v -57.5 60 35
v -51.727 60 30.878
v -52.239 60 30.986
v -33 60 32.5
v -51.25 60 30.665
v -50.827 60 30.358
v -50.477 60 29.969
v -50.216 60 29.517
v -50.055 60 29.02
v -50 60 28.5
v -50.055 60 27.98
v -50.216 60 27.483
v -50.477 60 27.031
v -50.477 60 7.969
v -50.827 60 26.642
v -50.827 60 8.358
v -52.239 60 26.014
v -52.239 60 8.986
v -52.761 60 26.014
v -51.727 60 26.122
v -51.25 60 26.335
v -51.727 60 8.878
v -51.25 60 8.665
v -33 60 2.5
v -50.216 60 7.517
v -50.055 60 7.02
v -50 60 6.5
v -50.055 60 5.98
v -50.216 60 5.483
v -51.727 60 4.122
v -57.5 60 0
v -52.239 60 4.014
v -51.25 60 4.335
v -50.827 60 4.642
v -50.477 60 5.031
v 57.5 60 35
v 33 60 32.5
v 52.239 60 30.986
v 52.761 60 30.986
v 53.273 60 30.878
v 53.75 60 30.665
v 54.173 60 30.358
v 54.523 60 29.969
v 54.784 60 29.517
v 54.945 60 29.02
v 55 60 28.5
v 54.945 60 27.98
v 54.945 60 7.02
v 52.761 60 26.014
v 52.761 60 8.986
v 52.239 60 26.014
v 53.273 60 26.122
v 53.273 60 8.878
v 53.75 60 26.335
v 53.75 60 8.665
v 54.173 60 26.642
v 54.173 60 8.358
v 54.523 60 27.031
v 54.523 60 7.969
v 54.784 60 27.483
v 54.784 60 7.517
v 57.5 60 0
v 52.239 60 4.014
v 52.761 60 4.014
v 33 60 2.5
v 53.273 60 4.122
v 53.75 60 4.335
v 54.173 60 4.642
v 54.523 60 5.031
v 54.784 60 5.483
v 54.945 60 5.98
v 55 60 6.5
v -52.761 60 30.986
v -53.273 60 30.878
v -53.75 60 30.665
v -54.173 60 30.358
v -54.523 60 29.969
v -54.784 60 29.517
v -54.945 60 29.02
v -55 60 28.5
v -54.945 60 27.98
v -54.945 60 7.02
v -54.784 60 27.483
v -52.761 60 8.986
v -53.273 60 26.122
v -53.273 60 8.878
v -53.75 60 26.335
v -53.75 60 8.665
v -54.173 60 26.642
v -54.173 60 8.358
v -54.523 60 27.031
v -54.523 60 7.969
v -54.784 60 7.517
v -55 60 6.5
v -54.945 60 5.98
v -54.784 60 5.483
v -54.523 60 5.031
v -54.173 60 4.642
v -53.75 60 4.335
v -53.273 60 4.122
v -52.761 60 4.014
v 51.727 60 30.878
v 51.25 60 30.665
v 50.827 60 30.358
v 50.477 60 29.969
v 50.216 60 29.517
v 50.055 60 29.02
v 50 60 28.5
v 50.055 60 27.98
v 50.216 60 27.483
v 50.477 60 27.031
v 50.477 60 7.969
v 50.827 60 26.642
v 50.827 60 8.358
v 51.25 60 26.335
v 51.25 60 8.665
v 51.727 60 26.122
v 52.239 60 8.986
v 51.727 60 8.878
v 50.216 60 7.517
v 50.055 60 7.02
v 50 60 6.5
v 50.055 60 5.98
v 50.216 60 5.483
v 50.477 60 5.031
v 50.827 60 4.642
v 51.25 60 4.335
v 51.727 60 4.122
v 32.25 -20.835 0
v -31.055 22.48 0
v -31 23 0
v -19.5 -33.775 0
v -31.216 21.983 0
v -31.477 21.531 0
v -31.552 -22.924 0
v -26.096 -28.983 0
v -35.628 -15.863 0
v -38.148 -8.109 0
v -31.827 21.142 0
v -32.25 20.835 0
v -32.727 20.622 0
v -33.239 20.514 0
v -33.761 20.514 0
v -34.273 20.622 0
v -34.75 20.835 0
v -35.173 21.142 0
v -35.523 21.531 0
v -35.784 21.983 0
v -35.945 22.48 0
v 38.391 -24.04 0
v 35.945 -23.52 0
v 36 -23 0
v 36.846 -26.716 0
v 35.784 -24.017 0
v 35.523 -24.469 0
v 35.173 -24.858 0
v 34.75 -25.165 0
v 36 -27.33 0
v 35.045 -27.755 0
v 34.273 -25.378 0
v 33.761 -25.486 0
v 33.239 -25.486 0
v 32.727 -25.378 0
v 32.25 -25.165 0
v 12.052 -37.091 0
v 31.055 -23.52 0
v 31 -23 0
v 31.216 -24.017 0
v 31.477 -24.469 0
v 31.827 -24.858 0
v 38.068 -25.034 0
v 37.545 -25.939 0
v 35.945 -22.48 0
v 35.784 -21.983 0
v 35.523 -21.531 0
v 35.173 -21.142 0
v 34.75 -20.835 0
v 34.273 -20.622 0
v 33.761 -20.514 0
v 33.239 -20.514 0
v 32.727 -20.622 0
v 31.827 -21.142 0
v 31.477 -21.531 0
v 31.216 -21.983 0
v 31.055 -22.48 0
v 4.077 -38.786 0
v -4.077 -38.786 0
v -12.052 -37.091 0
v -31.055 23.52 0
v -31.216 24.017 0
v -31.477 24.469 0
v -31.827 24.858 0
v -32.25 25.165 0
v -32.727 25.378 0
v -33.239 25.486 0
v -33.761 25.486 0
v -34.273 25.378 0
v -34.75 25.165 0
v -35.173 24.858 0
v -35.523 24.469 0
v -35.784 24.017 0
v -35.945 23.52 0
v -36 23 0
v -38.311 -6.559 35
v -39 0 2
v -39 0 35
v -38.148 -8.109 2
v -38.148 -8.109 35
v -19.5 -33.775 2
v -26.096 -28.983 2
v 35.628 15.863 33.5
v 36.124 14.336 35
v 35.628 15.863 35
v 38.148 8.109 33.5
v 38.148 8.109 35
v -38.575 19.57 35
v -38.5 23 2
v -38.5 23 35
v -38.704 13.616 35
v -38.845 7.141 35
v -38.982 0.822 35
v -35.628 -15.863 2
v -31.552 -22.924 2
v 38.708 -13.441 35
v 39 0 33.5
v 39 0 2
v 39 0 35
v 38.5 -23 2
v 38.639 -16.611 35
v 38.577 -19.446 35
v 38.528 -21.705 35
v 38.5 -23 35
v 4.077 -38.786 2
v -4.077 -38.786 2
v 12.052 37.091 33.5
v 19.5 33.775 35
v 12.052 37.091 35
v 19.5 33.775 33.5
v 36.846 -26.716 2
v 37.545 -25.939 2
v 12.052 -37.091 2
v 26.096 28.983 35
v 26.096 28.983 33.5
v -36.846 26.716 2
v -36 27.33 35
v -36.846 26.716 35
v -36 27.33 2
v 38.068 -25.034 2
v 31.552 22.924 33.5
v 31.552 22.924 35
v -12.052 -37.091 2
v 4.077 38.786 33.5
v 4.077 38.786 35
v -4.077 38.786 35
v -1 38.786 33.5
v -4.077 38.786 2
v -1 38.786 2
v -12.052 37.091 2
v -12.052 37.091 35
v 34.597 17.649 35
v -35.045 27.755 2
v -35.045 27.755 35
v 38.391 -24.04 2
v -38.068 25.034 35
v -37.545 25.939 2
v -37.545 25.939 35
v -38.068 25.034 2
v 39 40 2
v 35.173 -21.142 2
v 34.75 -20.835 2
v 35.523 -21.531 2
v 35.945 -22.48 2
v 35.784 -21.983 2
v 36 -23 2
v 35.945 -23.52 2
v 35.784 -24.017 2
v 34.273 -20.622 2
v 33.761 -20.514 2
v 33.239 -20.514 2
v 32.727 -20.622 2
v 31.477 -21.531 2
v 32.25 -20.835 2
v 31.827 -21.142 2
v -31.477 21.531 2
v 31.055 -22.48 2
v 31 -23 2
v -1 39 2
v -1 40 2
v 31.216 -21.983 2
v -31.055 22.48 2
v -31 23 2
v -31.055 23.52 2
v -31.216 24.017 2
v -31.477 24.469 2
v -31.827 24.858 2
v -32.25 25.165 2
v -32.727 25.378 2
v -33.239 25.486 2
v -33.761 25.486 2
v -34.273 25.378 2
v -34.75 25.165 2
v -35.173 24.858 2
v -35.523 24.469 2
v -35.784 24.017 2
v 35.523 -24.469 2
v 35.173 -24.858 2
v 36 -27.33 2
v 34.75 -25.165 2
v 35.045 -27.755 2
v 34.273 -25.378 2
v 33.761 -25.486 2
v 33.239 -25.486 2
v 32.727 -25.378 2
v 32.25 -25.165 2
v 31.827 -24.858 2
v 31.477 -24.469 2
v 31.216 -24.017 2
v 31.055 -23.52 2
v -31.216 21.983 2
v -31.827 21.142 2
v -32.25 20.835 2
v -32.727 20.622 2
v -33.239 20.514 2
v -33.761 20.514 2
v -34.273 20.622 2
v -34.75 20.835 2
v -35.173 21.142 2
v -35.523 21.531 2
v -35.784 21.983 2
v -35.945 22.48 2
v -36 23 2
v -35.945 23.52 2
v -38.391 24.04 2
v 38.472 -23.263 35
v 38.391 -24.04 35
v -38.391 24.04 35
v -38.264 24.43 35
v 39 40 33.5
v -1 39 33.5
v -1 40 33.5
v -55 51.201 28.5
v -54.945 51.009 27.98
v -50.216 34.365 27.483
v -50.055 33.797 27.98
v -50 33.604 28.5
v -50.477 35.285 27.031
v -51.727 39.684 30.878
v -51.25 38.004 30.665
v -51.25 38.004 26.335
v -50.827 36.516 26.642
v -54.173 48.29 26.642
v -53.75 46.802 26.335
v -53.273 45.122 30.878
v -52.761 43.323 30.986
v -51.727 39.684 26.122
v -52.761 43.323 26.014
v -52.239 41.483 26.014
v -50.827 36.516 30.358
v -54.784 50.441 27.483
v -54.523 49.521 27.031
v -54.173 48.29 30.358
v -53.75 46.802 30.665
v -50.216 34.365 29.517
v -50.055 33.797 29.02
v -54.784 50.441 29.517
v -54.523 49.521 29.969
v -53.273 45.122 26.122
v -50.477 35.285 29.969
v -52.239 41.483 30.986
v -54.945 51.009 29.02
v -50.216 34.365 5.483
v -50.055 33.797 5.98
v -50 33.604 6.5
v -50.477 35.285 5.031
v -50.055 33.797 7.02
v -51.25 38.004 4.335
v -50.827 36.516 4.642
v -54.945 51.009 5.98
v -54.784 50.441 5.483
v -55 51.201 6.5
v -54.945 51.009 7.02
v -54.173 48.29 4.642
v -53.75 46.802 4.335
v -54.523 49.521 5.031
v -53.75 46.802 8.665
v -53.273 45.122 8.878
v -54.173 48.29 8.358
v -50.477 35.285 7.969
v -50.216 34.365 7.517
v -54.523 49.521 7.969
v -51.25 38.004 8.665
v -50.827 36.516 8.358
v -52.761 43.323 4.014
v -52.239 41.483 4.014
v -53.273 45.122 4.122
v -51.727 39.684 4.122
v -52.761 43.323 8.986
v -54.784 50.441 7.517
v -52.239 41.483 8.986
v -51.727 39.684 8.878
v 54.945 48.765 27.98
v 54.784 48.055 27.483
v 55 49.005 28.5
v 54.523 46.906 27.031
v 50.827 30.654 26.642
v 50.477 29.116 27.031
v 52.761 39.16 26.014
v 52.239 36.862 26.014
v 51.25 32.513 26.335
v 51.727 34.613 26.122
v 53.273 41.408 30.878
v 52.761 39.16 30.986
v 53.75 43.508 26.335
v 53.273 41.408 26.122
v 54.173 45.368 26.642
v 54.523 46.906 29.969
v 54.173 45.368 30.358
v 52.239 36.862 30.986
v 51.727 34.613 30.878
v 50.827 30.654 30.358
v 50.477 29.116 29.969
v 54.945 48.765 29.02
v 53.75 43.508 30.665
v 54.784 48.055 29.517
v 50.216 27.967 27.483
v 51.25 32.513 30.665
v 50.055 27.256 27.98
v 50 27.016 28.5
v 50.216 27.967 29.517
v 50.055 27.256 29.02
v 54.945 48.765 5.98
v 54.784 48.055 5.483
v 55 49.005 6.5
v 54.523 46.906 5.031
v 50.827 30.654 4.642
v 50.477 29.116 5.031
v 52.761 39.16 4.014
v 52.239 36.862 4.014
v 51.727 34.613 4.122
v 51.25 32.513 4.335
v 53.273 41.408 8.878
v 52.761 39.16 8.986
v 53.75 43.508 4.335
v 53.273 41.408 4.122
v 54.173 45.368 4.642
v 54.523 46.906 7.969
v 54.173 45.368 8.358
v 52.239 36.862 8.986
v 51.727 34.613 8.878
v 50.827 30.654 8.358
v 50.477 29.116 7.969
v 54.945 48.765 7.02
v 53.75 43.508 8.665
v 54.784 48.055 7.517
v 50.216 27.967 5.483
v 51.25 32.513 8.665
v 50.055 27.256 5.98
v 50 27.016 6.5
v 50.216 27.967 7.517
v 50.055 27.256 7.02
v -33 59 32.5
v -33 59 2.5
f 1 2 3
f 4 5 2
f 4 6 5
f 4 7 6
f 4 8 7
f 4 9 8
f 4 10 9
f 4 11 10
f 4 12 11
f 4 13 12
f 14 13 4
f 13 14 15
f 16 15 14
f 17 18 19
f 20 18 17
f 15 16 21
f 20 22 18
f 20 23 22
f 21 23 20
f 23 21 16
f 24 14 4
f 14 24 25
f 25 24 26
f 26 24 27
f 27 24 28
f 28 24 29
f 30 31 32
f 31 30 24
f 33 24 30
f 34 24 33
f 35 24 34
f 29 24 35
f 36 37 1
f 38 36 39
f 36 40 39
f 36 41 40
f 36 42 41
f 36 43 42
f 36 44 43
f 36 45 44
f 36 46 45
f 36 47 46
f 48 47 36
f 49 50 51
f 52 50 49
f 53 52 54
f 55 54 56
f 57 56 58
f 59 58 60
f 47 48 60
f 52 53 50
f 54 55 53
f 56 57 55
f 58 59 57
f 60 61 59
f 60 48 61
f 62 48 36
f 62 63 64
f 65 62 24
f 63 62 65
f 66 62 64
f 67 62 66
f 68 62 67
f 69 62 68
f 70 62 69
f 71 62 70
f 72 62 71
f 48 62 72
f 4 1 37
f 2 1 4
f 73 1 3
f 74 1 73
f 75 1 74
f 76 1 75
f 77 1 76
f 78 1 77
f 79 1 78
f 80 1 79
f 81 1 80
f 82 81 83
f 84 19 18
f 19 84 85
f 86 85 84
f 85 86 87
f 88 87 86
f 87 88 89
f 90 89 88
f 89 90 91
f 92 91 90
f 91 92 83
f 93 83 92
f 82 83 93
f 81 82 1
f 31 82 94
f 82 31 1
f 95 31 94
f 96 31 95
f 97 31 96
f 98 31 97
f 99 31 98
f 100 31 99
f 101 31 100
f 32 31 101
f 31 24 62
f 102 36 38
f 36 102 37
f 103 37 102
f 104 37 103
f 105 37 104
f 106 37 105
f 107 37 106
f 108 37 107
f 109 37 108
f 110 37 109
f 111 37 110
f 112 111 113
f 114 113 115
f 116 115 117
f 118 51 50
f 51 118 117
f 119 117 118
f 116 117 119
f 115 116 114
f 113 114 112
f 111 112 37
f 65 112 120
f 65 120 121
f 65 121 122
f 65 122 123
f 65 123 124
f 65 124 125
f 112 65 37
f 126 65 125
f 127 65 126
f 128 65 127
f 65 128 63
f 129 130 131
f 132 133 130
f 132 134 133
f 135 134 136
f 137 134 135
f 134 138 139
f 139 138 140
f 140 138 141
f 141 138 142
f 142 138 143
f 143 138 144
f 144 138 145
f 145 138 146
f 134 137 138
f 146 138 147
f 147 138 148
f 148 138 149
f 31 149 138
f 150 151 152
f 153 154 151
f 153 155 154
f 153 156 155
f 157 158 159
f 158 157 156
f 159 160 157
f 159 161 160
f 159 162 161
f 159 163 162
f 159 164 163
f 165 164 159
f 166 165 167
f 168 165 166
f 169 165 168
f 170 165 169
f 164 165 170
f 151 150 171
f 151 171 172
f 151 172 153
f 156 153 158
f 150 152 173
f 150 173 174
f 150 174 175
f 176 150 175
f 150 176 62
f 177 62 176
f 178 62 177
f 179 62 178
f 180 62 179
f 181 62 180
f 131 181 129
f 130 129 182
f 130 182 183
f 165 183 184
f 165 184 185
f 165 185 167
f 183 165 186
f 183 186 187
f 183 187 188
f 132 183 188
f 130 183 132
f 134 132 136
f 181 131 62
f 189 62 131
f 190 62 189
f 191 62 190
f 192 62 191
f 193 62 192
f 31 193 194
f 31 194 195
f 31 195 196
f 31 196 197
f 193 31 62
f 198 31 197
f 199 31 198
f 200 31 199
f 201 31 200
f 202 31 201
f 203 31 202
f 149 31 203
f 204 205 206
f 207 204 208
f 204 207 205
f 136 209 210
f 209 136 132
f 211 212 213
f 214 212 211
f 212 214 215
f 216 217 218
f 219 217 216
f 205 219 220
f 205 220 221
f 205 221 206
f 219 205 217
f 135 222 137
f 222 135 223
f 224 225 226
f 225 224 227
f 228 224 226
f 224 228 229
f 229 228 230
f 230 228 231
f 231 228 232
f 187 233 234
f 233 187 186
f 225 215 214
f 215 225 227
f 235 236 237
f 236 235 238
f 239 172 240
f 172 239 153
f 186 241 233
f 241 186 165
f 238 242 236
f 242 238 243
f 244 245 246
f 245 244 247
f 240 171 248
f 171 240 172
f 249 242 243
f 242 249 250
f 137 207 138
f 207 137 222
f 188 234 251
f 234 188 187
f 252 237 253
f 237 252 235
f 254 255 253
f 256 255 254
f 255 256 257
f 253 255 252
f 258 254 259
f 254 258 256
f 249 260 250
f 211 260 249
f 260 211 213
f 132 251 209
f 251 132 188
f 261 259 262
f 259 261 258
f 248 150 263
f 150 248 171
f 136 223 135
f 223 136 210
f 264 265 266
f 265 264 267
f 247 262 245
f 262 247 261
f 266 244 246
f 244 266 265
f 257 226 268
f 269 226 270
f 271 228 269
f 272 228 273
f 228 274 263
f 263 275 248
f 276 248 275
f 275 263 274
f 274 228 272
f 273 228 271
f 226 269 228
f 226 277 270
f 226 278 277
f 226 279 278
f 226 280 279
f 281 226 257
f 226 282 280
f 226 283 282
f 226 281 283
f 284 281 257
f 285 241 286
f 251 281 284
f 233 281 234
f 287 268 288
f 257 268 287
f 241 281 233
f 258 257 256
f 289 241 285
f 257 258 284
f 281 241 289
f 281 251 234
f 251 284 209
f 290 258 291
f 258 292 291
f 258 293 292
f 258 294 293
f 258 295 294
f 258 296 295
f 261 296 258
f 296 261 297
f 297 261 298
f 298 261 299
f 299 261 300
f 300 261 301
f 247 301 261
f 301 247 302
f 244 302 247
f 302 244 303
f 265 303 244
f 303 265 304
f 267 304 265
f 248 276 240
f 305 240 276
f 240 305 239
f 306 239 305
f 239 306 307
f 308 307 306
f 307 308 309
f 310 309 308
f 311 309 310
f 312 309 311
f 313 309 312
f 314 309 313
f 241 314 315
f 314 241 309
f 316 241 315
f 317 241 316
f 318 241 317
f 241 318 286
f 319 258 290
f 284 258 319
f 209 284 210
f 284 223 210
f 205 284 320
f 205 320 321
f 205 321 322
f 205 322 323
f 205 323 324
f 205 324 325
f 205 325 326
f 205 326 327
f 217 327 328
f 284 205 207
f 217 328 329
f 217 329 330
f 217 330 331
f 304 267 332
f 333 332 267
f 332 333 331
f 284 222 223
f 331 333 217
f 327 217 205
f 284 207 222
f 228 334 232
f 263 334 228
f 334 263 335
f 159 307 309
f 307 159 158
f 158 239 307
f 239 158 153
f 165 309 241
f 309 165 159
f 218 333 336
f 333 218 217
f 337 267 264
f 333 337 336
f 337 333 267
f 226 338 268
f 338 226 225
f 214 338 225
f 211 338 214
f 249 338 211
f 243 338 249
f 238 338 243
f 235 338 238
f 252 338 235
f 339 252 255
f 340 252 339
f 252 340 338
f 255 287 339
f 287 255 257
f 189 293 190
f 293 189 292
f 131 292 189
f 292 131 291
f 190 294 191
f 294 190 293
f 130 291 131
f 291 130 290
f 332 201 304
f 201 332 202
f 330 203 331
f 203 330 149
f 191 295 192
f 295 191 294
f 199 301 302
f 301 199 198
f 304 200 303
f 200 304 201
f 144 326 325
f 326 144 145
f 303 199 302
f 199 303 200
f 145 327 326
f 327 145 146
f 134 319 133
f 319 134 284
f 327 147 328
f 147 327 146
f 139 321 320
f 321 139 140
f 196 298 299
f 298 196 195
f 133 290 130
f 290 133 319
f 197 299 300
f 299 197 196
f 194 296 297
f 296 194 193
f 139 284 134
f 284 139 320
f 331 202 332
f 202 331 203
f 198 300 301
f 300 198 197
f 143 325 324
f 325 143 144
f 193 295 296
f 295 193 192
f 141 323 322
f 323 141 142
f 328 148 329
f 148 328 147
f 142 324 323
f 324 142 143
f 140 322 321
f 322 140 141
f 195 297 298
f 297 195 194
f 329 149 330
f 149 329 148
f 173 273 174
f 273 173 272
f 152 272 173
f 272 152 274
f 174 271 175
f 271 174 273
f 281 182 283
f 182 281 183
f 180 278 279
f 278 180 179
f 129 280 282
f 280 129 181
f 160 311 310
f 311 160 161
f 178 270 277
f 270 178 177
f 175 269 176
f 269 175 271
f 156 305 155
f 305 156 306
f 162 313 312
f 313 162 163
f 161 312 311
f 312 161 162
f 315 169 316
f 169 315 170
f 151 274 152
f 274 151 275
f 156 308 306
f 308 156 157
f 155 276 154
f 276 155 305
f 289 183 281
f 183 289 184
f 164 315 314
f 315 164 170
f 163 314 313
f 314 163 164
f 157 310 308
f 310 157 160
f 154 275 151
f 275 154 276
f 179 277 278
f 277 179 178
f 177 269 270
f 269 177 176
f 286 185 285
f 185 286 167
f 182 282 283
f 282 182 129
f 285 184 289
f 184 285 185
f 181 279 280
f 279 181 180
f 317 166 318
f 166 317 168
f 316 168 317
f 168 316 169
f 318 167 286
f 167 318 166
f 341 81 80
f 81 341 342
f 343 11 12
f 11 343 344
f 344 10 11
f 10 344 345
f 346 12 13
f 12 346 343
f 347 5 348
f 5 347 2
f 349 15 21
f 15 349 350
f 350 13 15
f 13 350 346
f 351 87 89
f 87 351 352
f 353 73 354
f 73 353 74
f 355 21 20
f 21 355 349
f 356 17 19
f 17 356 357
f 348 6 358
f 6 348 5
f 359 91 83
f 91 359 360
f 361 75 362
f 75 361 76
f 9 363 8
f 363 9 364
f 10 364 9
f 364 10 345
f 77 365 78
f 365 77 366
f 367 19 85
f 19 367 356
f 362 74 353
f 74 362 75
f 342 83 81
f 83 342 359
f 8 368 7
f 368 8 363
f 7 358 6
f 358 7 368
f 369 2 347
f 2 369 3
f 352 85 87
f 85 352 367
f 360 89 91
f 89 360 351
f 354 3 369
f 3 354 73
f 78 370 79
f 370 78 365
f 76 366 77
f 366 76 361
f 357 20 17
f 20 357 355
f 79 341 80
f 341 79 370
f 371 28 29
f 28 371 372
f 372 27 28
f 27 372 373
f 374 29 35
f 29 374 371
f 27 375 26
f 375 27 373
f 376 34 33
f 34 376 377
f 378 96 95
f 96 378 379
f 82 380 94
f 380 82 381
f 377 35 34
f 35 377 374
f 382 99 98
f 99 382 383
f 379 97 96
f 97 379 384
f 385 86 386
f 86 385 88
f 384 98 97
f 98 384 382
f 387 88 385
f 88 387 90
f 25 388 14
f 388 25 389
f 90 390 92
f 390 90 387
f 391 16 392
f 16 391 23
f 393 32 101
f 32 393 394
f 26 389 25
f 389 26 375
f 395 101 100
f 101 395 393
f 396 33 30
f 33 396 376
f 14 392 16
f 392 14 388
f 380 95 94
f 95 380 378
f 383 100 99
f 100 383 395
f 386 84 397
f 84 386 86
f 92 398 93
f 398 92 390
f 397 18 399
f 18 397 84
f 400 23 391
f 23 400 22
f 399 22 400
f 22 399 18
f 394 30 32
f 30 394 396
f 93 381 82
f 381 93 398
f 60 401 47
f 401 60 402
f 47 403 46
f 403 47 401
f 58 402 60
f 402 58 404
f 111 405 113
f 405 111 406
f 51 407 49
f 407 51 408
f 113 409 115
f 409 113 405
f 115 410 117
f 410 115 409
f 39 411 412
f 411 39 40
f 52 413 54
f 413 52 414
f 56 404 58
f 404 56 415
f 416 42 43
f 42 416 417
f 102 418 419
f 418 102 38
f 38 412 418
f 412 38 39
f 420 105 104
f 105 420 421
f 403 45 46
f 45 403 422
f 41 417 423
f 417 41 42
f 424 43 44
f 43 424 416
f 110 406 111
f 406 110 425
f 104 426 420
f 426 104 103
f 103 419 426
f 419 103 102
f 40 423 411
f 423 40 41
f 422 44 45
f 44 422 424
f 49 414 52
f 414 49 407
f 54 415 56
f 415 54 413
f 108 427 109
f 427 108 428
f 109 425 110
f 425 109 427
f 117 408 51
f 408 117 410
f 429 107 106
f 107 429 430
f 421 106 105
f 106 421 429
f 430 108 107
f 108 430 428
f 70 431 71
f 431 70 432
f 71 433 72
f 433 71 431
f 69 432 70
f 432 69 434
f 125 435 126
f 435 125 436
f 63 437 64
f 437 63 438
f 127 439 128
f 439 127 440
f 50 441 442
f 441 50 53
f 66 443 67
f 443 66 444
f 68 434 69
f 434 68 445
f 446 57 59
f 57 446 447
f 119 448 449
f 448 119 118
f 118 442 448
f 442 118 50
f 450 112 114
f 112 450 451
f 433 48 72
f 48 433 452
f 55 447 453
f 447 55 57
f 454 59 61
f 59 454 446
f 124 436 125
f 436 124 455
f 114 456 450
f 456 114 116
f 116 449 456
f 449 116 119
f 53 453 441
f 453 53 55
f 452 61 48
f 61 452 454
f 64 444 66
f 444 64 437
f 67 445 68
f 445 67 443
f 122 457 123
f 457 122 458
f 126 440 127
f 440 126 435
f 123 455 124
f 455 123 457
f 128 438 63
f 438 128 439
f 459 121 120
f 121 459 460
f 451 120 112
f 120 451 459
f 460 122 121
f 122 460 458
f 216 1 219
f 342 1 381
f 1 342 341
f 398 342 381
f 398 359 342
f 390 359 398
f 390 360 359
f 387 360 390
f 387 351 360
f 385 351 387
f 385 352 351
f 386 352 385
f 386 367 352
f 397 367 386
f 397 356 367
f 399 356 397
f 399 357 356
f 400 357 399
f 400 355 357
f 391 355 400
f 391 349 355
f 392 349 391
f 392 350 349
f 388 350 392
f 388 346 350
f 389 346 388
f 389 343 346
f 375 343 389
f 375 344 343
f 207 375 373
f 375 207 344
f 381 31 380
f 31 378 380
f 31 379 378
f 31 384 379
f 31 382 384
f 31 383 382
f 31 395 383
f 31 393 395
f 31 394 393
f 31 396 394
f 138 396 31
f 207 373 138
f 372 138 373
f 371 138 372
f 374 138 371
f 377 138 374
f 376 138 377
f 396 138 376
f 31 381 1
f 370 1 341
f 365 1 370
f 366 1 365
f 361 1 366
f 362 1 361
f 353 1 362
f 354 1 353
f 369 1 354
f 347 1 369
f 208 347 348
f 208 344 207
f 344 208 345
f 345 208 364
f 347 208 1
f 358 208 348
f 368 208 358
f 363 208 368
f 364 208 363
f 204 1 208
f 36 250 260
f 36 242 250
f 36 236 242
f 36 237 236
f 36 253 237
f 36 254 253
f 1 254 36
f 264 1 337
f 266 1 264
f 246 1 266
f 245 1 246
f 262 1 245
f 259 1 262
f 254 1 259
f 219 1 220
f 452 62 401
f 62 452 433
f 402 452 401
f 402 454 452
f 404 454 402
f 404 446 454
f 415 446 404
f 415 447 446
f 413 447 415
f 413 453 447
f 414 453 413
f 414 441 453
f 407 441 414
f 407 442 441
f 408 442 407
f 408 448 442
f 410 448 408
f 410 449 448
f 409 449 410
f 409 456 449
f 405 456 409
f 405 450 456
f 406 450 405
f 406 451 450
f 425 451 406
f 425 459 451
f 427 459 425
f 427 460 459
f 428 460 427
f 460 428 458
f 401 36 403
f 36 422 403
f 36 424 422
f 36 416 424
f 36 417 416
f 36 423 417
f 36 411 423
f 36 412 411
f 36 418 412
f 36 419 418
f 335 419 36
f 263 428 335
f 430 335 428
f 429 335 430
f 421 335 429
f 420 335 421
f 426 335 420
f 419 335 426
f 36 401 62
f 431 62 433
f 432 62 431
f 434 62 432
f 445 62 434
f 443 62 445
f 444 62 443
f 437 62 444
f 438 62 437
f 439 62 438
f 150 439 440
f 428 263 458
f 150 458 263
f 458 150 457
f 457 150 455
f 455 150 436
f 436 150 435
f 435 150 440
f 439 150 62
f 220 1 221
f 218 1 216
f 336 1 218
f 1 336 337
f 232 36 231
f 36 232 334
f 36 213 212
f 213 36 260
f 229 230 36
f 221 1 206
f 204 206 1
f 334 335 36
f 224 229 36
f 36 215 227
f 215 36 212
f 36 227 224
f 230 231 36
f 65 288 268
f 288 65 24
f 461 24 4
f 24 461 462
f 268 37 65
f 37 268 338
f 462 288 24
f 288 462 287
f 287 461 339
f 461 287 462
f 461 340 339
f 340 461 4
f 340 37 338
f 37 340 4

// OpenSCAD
HEATER_LENGTH = 115;
HEATER_WIDTH = 35;
HEATER_HEIGHT = 26;
HEATER_HOLE_SPACING_X = 22;
HEATER_HOLE_SPACING_Y = 105;
HEATER_HOLE_DIA = 5;
HEATER_PORT_WIDTH = 30; // 25;
HEATER_PORT_LENGTH = 66; // 55;

BLOWER_WIDTH = 78;
BLOWER_LENGTH = 78;
BLOWER_HEIGHT = 33; // 30;
BLOWER_HOLE_SPACING_X = 67;
BLOWER_HOLE_SPACING_Y = 46;
BLOWER_HOLE_DIA = 5;
BLOWER_PORT_WIDTH = BLOWER_HEIGHT - 1.5;
BLOWER_PORT_LENGTH = 40;

HEATER_OFFSET = 60;
BLOWER_OFFSET = HEATER_WIDTH - BLOWER_HEIGHT;

$fn = 30;

module blower_port() {
  translate([BLOWER_WIDTH/2 - BLOWER_PORT_LENGTH, BLOWER_WIDTH/2, 0])
  cube(size = [BLOWER_PORT_LENGTH, 1, BLOWER_PORT_WIDTH]);
}

module blower_holes(dia = BLOWER_HOLE_DIA) {
  for(i = [-1, 1]) {
    translate([i * BLOWER_HOLE_SPACING_X/2, -i * BLOWER_HOLE_SPACING_Y/2, 0])
    cylinder(d = dia, h = BLOWER_HEIGHT);
  }
}

module blower() {
  union() {
    hull() {
      cylinder(d = BLOWER_WIDTH, h = BLOWER_HEIGHT);
      blower_holes(dia = 2 * BLOWER_HOLE_DIA);
    }
    translate([BLOWER_WIDTH/2 - BLOWER_PORT_LENGTH, 0, 0])
    cube(size = [BLOWER_PORT_LENGTH, BLOWER_WIDTH/2, BLOWER_PORT_WIDTH]);
  }
}

module heater_port() {
  translate([-HEATER_PORT_LENGTH/2, -1, (HEATER_WIDTH - HEATER_PORT_WIDTH)/2])
  cube(size = [HEATER_PORT_LENGTH, 1, HEATER_PORT_WIDTH]);
}

module heater_holes() {
  translate([0, 0, HEATER_WIDTH/2])
  rotate([-90, 0, 0])
  for(i = [-1, 1]) {
    for(j = [-1, 1]) {
      translate([i * HEATER_HOLE_SPACING_Y/2, j * HEATER_HOLE_SPACING_X/2, 0])
      cylinder(d = HEATER_HOLE_DIA, h = HEATER_HEIGHT);
    }
  }
}

module heater() {
  union() {
    translate([-HEATER_LENGTH/2, 0, 0])
    cube(size = [HEATER_LENGTH, HEATER_HEIGHT, HEATER_WIDTH]);
    
    translate([-HEATER_PORT_LENGTH/2, 0, (HEATER_WIDTH - HEATER_PORT_WIDTH)/2])
  cube(size = [HEATER_PORT_LENGTH, HEATER_HEIGHT, HEATER_PORT_WIDTH]);

    heater_holes();
  }
}

module body() {
  hull() {
    scale([1.0, 1.0, 1.0 + BLOWER_OFFSET/BLOWER_HEIGHT])
    blower();
    translate([0, HEATER_OFFSET, 0])
    heater(); 
  }
}

module port() {
  hull() {
    translate([0, 0, BLOWER_OFFSET])
    blower_port();
    translate([0, HEATER_OFFSET, 0])
    heater_port();
  }  
}

module assembly() {
  difference() {
    body();
    #port();

    translate([0, 0, BLOWER_OFFSET])
    blower();
    translate([0, HEATER_OFFSET, 0])
    heater();

    #blower_holes();
    
    #translate([0, HEATER_OFFSET - 2 * HEATER_HEIGHT, 0])
    scale([1.0, 2.0, 1.0])
    heater_holes();
  }
}

assembly();
